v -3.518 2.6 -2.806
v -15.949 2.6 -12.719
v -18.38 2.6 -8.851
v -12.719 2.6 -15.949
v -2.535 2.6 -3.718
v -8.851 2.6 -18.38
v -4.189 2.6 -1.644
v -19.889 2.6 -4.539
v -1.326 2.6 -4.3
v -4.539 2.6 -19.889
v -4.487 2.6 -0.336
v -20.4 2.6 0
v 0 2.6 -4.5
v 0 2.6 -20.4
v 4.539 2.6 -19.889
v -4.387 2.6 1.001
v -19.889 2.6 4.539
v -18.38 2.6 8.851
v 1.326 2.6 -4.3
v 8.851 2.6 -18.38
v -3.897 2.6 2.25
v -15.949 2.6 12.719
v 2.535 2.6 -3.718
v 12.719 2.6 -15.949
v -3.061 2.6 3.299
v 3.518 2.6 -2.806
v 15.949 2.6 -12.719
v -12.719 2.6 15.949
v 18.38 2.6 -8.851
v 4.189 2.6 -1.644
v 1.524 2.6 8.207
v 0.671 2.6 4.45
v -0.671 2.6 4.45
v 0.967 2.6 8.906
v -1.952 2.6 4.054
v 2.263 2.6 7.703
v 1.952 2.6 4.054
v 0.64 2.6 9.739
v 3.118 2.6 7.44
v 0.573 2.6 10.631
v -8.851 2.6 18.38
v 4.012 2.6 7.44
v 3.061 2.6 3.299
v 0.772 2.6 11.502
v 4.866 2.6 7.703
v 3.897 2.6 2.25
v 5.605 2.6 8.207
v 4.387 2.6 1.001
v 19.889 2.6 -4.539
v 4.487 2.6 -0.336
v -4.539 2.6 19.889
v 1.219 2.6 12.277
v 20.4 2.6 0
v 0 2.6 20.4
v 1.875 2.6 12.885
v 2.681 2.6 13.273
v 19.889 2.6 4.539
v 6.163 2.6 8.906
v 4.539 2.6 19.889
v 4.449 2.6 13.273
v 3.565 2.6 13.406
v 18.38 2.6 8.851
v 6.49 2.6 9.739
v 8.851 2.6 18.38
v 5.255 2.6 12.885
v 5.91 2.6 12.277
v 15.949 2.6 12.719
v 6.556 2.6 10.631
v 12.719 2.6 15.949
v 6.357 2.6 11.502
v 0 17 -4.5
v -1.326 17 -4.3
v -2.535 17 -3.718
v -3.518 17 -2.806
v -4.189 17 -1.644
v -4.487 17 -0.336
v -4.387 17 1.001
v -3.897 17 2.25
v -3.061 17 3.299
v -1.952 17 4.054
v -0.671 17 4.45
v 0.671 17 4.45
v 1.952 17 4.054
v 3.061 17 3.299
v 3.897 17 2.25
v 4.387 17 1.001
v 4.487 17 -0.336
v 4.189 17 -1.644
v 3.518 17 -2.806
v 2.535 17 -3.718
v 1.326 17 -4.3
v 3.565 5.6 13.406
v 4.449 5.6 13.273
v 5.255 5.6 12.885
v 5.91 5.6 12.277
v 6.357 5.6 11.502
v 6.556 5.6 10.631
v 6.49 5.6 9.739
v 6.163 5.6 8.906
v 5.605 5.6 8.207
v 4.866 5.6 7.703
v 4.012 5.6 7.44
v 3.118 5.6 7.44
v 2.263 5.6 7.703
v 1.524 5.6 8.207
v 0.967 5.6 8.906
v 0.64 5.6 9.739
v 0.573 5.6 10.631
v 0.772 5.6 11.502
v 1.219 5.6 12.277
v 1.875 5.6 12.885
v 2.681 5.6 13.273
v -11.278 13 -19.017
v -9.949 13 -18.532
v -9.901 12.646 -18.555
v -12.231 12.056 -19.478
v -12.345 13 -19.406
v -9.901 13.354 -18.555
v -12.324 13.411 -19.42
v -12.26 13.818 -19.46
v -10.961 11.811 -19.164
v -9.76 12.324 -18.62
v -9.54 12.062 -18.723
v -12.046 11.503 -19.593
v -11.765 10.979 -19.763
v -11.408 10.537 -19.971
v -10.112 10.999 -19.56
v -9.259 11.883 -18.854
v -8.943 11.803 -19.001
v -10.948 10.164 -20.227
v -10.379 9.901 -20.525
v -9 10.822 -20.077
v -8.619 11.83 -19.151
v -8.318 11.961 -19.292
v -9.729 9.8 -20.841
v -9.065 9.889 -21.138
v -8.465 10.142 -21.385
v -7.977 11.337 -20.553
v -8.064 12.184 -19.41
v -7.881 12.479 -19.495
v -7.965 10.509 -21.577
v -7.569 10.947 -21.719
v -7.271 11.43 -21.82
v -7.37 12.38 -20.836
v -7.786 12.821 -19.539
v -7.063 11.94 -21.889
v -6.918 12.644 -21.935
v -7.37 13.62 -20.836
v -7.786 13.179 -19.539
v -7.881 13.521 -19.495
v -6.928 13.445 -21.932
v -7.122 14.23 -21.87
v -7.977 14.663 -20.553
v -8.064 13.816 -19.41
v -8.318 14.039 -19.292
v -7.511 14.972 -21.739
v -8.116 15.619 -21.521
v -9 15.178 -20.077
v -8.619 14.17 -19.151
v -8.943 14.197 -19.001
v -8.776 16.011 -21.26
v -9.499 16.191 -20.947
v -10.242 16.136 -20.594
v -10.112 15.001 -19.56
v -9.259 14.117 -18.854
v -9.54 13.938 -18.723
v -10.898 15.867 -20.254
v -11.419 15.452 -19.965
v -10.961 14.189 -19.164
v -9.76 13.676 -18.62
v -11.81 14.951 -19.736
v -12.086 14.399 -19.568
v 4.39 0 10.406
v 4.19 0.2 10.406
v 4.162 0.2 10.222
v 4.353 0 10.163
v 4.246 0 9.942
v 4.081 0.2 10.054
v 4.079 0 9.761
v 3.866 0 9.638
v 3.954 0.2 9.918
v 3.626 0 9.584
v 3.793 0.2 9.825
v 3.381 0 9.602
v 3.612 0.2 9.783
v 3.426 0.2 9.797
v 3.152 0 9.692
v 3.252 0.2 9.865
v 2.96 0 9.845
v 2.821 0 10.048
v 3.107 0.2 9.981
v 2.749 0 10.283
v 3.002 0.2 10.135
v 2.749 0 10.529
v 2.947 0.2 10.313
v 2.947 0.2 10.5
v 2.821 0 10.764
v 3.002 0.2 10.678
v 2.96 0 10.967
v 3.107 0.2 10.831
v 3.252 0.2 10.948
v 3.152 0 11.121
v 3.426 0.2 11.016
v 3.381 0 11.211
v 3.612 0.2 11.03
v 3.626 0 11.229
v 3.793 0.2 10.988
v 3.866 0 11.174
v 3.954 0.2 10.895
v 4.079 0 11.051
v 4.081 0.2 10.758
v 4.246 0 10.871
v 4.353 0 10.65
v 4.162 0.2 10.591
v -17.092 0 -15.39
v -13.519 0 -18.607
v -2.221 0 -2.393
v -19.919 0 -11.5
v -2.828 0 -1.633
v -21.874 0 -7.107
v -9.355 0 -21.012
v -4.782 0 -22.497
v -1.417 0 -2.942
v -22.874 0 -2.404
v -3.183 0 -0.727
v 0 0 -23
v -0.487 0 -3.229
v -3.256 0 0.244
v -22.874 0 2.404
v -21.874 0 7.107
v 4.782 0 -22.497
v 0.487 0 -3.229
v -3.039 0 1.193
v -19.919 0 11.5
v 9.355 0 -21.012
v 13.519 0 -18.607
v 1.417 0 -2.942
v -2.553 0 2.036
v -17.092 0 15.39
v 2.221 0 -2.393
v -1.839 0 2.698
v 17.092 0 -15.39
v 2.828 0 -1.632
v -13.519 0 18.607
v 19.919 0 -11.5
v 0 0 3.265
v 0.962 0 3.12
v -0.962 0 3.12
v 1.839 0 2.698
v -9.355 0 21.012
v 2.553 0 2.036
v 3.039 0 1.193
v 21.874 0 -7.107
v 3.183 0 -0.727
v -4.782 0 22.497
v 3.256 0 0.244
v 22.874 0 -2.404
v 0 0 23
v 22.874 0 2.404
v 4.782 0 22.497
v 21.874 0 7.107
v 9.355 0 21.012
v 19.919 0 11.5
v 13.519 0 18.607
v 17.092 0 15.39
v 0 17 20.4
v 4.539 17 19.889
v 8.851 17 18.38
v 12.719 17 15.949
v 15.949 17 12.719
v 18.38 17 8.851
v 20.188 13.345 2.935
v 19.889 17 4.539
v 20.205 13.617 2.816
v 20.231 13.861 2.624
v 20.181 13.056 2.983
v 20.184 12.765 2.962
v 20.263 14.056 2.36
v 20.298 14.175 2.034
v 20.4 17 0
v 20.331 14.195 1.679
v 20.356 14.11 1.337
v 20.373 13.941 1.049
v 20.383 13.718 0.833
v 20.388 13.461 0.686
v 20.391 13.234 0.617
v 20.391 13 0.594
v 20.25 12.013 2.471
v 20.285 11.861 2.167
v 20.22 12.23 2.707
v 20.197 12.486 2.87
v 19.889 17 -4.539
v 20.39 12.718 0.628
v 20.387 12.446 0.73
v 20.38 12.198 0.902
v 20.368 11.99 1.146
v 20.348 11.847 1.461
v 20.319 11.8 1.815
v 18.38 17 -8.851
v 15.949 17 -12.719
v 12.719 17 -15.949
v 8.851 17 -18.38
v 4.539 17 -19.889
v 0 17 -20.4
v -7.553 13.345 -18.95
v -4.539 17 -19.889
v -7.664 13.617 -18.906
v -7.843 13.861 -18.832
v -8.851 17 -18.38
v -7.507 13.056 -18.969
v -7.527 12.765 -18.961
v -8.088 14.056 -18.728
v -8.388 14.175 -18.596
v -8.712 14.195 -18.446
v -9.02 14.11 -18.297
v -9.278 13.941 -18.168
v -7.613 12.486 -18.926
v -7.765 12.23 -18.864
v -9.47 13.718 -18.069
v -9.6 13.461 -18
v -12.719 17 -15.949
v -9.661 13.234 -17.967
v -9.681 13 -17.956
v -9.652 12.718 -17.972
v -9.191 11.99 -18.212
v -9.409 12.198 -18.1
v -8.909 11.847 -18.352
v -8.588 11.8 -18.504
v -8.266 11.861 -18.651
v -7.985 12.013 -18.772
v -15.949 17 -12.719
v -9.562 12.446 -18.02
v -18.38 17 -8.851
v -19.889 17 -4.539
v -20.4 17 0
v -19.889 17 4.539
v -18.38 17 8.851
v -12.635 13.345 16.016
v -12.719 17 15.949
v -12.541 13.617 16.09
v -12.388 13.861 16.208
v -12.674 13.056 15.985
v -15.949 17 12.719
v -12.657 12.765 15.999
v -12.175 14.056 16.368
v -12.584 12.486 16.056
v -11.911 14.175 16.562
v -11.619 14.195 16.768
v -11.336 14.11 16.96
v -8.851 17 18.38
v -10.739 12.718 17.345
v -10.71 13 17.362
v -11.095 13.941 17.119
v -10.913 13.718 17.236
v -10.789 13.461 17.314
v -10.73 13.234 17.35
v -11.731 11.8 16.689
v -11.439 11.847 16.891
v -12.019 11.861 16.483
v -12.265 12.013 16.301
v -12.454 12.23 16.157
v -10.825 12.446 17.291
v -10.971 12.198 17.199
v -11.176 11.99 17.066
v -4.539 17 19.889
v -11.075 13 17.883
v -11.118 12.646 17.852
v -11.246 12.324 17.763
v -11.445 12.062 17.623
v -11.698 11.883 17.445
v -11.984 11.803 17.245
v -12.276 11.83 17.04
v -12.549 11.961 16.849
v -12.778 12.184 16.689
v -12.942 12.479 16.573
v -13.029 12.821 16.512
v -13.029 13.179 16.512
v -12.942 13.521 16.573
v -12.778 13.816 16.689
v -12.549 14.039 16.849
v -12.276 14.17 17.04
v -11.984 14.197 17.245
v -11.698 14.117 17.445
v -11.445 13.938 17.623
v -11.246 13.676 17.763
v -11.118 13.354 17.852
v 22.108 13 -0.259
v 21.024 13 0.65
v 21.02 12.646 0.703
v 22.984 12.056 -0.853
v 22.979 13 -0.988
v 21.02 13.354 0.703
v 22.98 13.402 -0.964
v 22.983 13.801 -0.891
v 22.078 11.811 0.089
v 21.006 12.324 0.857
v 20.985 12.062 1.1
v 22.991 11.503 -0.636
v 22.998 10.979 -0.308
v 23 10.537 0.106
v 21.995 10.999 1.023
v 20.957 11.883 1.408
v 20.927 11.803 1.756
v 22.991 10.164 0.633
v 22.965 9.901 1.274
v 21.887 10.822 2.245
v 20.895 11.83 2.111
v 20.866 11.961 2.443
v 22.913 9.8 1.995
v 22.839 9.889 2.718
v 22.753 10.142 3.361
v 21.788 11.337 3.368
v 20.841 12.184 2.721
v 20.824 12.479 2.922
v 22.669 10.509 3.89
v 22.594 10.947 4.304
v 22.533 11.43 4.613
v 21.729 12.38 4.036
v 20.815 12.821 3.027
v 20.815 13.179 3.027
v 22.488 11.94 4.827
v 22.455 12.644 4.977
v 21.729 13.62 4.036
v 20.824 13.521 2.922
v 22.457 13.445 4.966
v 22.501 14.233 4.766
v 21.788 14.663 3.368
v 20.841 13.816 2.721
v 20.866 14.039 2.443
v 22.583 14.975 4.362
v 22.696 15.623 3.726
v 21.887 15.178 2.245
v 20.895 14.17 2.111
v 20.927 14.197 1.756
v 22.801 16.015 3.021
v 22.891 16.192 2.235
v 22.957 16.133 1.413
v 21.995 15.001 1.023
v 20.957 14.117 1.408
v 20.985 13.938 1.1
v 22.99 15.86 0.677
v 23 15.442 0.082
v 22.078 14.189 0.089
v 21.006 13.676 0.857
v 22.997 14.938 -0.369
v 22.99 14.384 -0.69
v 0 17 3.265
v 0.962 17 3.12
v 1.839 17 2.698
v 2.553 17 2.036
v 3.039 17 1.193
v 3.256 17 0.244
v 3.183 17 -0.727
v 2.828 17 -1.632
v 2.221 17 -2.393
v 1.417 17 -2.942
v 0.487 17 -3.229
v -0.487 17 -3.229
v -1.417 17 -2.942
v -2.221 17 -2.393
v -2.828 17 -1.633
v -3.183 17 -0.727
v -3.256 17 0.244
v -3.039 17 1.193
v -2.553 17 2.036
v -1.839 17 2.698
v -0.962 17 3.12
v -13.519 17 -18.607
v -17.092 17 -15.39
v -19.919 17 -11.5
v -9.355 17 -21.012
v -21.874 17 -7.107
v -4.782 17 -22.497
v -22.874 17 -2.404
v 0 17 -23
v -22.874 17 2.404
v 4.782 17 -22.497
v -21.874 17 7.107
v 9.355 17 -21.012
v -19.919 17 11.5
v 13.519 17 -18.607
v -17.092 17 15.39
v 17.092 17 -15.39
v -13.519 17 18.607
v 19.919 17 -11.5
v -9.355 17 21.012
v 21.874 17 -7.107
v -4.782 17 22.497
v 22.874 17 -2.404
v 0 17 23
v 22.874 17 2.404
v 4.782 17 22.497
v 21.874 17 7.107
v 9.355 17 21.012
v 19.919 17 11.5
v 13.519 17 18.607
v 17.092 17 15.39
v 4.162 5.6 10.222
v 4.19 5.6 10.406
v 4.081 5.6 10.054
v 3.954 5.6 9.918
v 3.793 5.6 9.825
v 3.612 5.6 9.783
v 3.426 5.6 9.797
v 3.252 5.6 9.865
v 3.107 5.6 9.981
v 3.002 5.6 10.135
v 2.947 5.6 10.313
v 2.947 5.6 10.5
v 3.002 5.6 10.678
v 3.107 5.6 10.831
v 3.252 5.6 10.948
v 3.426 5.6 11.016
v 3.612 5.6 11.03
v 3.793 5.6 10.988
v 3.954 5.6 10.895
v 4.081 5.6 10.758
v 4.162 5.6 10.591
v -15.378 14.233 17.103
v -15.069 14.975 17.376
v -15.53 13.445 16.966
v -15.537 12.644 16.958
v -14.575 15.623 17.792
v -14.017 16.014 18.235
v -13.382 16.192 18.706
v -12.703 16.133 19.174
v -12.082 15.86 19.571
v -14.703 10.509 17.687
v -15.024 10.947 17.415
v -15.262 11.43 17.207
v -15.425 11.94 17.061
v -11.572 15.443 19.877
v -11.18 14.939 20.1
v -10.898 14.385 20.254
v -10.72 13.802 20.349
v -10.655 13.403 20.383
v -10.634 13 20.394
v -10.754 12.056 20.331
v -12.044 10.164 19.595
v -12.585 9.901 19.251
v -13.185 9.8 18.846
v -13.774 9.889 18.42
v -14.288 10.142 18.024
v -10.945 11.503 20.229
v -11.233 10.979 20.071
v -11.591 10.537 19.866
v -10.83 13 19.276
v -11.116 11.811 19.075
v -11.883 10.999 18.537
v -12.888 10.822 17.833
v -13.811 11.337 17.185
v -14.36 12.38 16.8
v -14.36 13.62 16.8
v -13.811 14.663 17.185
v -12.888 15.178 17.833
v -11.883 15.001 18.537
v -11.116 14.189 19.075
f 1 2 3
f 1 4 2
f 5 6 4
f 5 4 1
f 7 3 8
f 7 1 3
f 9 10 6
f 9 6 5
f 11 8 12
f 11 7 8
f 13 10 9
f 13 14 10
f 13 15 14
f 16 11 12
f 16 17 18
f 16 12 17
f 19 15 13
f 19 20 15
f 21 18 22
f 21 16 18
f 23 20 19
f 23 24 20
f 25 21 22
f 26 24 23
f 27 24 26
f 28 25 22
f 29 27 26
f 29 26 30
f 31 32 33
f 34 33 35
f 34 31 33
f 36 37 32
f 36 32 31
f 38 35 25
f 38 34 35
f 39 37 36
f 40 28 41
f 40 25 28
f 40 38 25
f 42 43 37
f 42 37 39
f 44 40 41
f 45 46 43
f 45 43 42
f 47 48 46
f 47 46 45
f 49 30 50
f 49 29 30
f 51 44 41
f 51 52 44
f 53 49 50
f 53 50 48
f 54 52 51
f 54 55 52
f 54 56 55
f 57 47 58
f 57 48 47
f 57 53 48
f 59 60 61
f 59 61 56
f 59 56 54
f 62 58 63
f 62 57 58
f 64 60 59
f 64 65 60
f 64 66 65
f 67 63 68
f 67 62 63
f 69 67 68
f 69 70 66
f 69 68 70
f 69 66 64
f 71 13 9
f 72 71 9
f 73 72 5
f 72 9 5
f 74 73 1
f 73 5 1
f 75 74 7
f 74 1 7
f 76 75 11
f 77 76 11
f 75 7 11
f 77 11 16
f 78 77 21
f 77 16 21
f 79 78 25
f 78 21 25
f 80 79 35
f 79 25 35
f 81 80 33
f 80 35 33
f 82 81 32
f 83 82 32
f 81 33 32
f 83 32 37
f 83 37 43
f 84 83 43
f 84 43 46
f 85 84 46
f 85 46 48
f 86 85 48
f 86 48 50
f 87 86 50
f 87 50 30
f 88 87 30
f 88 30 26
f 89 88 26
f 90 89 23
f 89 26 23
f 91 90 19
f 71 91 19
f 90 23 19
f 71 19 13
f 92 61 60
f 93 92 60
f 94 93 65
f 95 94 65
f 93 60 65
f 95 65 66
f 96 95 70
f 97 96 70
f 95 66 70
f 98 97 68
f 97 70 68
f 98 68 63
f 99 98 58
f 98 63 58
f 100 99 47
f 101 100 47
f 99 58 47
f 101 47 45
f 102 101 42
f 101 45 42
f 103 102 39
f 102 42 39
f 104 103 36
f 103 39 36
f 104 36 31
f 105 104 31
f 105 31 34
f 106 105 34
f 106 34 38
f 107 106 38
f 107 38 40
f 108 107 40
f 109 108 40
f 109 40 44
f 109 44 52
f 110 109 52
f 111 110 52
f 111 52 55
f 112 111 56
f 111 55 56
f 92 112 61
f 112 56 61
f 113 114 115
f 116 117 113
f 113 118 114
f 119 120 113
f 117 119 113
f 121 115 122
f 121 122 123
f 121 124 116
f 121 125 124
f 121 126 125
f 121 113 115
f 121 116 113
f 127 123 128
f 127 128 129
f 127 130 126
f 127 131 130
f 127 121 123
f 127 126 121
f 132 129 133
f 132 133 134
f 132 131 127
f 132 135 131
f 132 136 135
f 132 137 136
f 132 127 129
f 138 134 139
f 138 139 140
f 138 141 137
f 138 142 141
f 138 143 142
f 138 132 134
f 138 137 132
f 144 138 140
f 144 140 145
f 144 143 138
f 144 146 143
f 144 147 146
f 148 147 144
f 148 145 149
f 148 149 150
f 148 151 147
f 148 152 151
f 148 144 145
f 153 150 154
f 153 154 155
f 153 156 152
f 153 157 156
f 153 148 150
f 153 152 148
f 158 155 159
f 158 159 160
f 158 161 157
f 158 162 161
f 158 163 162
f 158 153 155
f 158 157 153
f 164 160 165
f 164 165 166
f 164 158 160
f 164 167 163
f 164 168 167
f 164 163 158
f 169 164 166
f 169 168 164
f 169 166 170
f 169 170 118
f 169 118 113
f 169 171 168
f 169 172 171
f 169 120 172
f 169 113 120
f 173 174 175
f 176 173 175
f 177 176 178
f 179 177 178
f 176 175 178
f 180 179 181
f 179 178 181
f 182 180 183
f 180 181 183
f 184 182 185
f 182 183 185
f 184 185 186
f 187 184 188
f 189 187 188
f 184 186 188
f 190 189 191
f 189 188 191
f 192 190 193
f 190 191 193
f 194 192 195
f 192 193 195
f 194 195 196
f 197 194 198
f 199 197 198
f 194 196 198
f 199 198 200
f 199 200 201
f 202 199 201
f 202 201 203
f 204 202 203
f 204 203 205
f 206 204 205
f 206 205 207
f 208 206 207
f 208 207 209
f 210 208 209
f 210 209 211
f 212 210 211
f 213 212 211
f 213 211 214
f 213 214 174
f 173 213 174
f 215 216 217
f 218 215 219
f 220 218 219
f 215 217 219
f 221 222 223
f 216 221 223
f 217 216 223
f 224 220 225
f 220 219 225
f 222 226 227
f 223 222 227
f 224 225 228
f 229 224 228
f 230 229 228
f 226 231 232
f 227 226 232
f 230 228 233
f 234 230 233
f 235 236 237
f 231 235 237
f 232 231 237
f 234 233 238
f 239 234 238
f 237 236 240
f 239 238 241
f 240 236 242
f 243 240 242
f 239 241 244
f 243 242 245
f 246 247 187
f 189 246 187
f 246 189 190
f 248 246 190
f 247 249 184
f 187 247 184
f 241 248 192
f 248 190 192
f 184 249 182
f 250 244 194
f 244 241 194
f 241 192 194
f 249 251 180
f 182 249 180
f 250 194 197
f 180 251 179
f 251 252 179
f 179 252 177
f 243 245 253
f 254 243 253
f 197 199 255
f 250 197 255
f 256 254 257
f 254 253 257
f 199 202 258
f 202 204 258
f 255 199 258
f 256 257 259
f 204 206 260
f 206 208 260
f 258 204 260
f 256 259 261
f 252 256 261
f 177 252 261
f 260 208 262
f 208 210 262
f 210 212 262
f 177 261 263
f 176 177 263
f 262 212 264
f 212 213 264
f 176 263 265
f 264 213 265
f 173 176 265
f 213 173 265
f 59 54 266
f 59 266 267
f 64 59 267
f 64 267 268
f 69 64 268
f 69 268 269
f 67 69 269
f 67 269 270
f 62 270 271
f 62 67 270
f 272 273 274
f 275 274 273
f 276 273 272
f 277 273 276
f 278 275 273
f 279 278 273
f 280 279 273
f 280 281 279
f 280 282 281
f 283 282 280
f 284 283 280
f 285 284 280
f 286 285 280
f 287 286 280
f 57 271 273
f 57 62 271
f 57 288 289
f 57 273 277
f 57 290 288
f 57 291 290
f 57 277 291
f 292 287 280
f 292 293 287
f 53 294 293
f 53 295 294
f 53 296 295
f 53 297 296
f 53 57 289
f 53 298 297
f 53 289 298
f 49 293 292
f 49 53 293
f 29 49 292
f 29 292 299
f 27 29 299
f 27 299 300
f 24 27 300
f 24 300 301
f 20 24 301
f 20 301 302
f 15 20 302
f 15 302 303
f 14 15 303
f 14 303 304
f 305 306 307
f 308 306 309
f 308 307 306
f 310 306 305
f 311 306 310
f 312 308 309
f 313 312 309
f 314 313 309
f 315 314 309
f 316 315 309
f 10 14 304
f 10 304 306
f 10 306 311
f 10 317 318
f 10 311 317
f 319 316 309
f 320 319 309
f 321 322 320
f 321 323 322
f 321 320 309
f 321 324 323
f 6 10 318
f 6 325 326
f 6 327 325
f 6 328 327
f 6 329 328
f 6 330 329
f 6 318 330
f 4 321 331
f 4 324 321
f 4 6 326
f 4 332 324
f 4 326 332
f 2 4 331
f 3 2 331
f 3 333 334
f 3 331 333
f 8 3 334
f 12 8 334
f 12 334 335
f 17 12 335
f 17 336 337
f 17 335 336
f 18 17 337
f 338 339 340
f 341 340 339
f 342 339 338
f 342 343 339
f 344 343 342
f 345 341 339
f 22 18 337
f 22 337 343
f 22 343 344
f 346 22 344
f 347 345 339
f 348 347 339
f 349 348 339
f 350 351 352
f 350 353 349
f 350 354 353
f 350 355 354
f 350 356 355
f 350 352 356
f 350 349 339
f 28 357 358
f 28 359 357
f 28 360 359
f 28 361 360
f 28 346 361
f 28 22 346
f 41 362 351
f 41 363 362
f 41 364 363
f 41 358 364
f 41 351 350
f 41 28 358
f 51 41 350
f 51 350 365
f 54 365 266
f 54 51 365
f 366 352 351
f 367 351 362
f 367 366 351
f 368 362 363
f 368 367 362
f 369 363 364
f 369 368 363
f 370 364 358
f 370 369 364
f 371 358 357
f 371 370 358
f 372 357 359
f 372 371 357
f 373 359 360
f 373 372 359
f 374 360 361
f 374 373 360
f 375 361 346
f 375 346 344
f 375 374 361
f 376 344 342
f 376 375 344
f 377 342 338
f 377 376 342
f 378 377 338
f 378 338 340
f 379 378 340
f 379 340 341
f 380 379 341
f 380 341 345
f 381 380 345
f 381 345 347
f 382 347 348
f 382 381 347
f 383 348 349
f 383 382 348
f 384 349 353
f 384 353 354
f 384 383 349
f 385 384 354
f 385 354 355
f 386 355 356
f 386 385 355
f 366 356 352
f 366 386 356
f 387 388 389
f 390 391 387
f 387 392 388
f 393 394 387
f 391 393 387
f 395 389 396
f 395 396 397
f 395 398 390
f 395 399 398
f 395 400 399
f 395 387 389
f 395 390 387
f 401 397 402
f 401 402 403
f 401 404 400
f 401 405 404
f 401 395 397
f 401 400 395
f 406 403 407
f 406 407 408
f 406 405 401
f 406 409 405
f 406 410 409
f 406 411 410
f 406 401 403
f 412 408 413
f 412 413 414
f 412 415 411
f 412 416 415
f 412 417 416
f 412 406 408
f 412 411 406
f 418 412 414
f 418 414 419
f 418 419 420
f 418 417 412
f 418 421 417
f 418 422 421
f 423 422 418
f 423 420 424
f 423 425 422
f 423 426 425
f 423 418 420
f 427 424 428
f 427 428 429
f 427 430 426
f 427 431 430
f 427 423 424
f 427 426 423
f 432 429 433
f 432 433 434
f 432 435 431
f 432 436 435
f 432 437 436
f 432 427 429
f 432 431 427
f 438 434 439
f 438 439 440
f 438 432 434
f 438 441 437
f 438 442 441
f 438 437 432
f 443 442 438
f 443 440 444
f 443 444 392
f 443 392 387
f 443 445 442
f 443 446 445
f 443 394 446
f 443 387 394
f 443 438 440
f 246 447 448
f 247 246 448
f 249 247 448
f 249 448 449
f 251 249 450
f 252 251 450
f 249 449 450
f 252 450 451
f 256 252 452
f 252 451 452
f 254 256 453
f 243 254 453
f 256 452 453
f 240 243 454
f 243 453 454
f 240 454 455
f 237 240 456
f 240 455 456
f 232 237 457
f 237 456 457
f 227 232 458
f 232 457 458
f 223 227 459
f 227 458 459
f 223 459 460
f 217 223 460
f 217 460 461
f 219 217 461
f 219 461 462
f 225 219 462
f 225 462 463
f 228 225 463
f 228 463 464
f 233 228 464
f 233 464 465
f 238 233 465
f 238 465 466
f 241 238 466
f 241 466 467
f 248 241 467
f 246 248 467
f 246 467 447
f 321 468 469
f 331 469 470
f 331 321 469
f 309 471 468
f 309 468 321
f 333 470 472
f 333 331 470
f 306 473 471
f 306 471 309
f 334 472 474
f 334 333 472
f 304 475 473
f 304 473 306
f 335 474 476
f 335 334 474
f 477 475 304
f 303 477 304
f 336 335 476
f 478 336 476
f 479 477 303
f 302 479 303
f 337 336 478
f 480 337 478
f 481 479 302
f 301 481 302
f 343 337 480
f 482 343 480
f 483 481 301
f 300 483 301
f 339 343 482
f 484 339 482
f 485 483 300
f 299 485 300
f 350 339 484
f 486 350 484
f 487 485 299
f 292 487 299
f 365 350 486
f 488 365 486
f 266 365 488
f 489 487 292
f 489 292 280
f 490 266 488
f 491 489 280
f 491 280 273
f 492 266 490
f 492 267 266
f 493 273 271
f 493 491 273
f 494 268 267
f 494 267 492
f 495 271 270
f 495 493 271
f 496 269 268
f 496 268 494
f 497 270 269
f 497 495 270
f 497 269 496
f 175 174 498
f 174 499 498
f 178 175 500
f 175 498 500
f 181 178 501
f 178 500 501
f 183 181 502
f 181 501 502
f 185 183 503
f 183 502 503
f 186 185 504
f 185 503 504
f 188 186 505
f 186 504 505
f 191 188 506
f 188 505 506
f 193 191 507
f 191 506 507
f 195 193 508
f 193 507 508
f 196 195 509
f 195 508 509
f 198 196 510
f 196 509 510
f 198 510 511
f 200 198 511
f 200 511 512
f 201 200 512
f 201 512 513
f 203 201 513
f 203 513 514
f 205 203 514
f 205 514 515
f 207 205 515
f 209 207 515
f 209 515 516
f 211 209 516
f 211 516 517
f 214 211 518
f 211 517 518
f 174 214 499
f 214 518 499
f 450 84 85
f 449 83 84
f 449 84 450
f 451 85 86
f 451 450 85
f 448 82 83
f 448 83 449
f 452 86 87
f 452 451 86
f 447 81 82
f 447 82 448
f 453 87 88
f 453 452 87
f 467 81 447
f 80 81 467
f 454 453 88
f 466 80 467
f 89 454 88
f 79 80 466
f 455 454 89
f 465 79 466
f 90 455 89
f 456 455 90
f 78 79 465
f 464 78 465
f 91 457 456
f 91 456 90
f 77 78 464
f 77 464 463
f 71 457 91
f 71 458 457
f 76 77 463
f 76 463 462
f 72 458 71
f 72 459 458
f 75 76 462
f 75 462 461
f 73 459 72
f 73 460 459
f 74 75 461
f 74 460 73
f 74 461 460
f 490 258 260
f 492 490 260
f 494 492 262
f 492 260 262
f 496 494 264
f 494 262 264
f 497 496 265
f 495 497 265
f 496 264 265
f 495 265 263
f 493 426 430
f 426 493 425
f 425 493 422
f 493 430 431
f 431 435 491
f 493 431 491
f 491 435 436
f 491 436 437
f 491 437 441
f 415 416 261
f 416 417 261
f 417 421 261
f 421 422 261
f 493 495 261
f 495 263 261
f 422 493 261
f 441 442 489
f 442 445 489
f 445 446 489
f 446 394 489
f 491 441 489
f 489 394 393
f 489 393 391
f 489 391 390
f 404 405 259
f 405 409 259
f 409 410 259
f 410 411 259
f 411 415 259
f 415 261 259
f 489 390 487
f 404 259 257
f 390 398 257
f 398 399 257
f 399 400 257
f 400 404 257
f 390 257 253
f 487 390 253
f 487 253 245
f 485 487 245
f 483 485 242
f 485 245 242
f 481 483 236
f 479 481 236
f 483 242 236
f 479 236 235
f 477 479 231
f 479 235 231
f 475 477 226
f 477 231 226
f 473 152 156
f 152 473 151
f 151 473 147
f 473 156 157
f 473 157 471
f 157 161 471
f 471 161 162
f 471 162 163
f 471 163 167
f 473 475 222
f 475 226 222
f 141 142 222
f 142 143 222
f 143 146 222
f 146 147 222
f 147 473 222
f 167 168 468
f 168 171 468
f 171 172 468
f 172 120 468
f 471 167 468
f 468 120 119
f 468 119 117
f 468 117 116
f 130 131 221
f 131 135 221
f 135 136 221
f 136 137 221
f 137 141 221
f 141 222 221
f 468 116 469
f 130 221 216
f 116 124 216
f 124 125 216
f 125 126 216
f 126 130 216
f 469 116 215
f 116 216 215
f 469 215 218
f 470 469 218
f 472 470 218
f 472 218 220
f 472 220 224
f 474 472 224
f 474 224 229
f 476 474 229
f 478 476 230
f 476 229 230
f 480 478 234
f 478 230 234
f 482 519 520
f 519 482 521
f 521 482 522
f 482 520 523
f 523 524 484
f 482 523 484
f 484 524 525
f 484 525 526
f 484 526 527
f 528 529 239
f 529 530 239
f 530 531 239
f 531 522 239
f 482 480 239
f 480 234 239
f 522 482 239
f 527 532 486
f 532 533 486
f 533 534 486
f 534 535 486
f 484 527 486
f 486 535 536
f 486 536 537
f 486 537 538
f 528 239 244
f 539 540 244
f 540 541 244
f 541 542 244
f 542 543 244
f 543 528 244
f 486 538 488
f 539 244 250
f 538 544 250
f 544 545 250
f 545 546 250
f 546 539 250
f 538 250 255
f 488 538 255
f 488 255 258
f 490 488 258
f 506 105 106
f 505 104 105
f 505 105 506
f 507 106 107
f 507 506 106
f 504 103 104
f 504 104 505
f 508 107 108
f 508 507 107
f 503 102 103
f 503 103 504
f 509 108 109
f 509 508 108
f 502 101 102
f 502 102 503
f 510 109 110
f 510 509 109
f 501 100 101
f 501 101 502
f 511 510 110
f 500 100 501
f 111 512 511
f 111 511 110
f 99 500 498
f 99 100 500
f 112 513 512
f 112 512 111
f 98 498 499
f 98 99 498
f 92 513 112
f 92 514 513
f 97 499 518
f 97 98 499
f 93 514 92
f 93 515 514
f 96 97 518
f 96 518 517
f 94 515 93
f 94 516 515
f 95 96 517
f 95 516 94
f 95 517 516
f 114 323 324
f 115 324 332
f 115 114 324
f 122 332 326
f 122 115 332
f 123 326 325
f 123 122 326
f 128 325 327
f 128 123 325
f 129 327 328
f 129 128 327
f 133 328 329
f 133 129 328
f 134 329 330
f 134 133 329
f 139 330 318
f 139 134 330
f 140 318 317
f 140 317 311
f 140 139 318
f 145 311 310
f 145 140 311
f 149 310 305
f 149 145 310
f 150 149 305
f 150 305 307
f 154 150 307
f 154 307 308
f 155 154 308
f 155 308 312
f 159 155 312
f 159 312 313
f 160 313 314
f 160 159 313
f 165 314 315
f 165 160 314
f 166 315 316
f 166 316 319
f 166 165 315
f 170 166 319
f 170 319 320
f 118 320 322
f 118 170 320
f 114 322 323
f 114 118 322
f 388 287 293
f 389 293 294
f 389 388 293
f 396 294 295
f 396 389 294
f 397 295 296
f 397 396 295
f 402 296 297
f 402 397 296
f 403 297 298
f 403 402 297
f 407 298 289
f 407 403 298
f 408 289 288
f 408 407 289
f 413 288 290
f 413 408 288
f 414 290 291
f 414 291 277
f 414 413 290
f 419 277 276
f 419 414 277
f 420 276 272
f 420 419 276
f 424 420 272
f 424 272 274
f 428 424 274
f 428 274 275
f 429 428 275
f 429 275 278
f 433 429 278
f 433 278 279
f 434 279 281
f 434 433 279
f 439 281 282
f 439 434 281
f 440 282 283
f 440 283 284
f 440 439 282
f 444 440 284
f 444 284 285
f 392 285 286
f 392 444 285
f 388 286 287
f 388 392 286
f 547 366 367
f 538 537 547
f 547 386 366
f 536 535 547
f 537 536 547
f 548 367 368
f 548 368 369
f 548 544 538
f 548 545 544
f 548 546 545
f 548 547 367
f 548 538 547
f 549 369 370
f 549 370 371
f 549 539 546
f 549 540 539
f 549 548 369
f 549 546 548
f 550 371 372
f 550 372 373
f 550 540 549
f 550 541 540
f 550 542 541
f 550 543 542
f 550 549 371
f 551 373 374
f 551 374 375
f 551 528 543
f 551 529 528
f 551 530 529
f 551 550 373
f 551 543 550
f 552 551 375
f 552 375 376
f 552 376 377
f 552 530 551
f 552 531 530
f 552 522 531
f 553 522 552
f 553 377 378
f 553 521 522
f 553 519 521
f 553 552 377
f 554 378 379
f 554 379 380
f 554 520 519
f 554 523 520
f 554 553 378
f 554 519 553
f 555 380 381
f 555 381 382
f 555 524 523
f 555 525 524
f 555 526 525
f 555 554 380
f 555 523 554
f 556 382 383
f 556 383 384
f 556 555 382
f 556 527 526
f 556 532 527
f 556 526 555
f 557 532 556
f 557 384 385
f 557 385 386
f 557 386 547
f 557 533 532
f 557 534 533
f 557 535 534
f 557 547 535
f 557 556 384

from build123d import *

# Parameters (mm, degrees)
SKETCH1_R                     = 23
BOSS_EXTRUDE1_DEPTH           = 17
SHELL1_T                      = -2.6
SKETCH4_R                     = 4.5
BOSS_EXTRUDE3_DEPTH           = 14.4
SKETCH5_R                     = 3.265
CUT_EXTRUDE2_DEPTH            = 37.701498607
CIRPATTERN1_COUNT             = 3
SKETCH14_R                    = 3
BOSS_EXTRUDE7_DEPTH           = 3
M1_6_TAPPED_HOLE1_D           = 1.25
M1_6_TAPPED_HOLE1_CSINK_D     = 1.65
M1_6_TAPPED_HOLE1_CSINK_ANGLE = 90


with BuildPart() as part:
    # Sketch1 → Boss-Extrude1 (new body)
    with BuildSketch(Plane(origin=(0, 0, 0), x_dir=(1, 0, 0), z_dir=(0, 1, 0))):
        with Locations(Location((0, 0, 0), (0, 0, 270))):
            Circle(SKETCH1_R)
    extrude(amount=BOSS_EXTRUDE1_DEPTH)

    # Shell1
    shell1_openings = [part.faces().sort_by_distance(p)[0] for p in [
        (0, 17, 0),
    ]]
    offset(amount=SHELL1_T, openings=shell1_openings, kind=Kind.INTERSECTION)

    # Sketch4 → Boss-Extrude3 (add)
    with BuildSketch(Plane(origin=(0, 2.6, 0), x_dir=(1, 0, 0), z_dir=(0, 1, 0))):
        with Locations(Location((0, 0, 0), (0, 0, 90))):
            Circle(SKETCH4_R)
    extrude(amount=BOSS_EXTRUDE3_DEPTH)

    # Sketch5 → Cut-Extrude2 (cut, through all)
    with BuildSketch(Plane(origin=(0, 17, 0), x_dir=(1, 0, 0), z_dir=(0, 1, 0))):
        with Locations(Location((0, 0, 0), (0, 0, 270))):
            Circle(SKETCH5_R)
    extrude(amount=-CUT_EXTRUDE2_DEPTH, mode=Mode.SUBTRACT)

    # Sketch9 → CSK SLOT for M2 Countersunk Flat Head Screw1 (revolve, cut)
    with BuildSketch(Plane(origin=(22.911051483, 13, 2.020821599), x_dir=(0.08786180866791495, 0, -0.9961326731804369), z_dir=(0, 1, 0))):
        Polygon((0, 0), (0, 5.721032743), (1.2, 5), (1.2, 2), (3.2, 0), align=None)
    csk_slot_for_m2_countersunk_flat_head_sc = revolve(axis=Axis((29.236493958, 13, 2.578744084), (-0.9961326731804366, 0, -0.08786180866791493)), mode=Mode.SUBTRACT)

    # CirPattern1: CSK SLOT for M2 Countersunk Flat Head Screw1 ×3 about axis
    cirpattern1_axis = Axis((0, 17, 0), (0, -1, 0))
    for i in range(1, CIRPATTERN1_COUNT):
        add(csk_slot_for_m2_countersunk_flat_head_sc.rotate(cirpattern1_axis, i * 360 / CIRPATTERN1_COUNT), mode=Mode.SUBTRACT)

    # Sketch14 → Boss-Extrude7 (add)
    with BuildSketch(Plane(origin=(0, 2.6, 0), x_dir=(1, 0, 0), z_dir=(0, 1, 0))):
        with Locations(Location((3.564798354, -10.406354438, 0), (0, 0, 270))):
            Circle(SKETCH14_R)
    extrude(amount=BOSS_EXTRUDE7_DEPTH)

    # M1.6 Tapped Hole1 (through all)
    with Locations(Plane(origin=(0, 0, 0), x_dir=(-1, 0, 0), z_dir=(0, -1, 0))):
        with Locations((-3.564798354, -10.406354438)):
            CounterSinkHole(M1_6_TAPPED_HOLE1_D / 2, M1_6_TAPPED_HOLE1_CSINK_D / 2, counter_sink_angle=M1_6_TAPPED_HOLE1_CSINK_ANGLE)


solid = part.part
